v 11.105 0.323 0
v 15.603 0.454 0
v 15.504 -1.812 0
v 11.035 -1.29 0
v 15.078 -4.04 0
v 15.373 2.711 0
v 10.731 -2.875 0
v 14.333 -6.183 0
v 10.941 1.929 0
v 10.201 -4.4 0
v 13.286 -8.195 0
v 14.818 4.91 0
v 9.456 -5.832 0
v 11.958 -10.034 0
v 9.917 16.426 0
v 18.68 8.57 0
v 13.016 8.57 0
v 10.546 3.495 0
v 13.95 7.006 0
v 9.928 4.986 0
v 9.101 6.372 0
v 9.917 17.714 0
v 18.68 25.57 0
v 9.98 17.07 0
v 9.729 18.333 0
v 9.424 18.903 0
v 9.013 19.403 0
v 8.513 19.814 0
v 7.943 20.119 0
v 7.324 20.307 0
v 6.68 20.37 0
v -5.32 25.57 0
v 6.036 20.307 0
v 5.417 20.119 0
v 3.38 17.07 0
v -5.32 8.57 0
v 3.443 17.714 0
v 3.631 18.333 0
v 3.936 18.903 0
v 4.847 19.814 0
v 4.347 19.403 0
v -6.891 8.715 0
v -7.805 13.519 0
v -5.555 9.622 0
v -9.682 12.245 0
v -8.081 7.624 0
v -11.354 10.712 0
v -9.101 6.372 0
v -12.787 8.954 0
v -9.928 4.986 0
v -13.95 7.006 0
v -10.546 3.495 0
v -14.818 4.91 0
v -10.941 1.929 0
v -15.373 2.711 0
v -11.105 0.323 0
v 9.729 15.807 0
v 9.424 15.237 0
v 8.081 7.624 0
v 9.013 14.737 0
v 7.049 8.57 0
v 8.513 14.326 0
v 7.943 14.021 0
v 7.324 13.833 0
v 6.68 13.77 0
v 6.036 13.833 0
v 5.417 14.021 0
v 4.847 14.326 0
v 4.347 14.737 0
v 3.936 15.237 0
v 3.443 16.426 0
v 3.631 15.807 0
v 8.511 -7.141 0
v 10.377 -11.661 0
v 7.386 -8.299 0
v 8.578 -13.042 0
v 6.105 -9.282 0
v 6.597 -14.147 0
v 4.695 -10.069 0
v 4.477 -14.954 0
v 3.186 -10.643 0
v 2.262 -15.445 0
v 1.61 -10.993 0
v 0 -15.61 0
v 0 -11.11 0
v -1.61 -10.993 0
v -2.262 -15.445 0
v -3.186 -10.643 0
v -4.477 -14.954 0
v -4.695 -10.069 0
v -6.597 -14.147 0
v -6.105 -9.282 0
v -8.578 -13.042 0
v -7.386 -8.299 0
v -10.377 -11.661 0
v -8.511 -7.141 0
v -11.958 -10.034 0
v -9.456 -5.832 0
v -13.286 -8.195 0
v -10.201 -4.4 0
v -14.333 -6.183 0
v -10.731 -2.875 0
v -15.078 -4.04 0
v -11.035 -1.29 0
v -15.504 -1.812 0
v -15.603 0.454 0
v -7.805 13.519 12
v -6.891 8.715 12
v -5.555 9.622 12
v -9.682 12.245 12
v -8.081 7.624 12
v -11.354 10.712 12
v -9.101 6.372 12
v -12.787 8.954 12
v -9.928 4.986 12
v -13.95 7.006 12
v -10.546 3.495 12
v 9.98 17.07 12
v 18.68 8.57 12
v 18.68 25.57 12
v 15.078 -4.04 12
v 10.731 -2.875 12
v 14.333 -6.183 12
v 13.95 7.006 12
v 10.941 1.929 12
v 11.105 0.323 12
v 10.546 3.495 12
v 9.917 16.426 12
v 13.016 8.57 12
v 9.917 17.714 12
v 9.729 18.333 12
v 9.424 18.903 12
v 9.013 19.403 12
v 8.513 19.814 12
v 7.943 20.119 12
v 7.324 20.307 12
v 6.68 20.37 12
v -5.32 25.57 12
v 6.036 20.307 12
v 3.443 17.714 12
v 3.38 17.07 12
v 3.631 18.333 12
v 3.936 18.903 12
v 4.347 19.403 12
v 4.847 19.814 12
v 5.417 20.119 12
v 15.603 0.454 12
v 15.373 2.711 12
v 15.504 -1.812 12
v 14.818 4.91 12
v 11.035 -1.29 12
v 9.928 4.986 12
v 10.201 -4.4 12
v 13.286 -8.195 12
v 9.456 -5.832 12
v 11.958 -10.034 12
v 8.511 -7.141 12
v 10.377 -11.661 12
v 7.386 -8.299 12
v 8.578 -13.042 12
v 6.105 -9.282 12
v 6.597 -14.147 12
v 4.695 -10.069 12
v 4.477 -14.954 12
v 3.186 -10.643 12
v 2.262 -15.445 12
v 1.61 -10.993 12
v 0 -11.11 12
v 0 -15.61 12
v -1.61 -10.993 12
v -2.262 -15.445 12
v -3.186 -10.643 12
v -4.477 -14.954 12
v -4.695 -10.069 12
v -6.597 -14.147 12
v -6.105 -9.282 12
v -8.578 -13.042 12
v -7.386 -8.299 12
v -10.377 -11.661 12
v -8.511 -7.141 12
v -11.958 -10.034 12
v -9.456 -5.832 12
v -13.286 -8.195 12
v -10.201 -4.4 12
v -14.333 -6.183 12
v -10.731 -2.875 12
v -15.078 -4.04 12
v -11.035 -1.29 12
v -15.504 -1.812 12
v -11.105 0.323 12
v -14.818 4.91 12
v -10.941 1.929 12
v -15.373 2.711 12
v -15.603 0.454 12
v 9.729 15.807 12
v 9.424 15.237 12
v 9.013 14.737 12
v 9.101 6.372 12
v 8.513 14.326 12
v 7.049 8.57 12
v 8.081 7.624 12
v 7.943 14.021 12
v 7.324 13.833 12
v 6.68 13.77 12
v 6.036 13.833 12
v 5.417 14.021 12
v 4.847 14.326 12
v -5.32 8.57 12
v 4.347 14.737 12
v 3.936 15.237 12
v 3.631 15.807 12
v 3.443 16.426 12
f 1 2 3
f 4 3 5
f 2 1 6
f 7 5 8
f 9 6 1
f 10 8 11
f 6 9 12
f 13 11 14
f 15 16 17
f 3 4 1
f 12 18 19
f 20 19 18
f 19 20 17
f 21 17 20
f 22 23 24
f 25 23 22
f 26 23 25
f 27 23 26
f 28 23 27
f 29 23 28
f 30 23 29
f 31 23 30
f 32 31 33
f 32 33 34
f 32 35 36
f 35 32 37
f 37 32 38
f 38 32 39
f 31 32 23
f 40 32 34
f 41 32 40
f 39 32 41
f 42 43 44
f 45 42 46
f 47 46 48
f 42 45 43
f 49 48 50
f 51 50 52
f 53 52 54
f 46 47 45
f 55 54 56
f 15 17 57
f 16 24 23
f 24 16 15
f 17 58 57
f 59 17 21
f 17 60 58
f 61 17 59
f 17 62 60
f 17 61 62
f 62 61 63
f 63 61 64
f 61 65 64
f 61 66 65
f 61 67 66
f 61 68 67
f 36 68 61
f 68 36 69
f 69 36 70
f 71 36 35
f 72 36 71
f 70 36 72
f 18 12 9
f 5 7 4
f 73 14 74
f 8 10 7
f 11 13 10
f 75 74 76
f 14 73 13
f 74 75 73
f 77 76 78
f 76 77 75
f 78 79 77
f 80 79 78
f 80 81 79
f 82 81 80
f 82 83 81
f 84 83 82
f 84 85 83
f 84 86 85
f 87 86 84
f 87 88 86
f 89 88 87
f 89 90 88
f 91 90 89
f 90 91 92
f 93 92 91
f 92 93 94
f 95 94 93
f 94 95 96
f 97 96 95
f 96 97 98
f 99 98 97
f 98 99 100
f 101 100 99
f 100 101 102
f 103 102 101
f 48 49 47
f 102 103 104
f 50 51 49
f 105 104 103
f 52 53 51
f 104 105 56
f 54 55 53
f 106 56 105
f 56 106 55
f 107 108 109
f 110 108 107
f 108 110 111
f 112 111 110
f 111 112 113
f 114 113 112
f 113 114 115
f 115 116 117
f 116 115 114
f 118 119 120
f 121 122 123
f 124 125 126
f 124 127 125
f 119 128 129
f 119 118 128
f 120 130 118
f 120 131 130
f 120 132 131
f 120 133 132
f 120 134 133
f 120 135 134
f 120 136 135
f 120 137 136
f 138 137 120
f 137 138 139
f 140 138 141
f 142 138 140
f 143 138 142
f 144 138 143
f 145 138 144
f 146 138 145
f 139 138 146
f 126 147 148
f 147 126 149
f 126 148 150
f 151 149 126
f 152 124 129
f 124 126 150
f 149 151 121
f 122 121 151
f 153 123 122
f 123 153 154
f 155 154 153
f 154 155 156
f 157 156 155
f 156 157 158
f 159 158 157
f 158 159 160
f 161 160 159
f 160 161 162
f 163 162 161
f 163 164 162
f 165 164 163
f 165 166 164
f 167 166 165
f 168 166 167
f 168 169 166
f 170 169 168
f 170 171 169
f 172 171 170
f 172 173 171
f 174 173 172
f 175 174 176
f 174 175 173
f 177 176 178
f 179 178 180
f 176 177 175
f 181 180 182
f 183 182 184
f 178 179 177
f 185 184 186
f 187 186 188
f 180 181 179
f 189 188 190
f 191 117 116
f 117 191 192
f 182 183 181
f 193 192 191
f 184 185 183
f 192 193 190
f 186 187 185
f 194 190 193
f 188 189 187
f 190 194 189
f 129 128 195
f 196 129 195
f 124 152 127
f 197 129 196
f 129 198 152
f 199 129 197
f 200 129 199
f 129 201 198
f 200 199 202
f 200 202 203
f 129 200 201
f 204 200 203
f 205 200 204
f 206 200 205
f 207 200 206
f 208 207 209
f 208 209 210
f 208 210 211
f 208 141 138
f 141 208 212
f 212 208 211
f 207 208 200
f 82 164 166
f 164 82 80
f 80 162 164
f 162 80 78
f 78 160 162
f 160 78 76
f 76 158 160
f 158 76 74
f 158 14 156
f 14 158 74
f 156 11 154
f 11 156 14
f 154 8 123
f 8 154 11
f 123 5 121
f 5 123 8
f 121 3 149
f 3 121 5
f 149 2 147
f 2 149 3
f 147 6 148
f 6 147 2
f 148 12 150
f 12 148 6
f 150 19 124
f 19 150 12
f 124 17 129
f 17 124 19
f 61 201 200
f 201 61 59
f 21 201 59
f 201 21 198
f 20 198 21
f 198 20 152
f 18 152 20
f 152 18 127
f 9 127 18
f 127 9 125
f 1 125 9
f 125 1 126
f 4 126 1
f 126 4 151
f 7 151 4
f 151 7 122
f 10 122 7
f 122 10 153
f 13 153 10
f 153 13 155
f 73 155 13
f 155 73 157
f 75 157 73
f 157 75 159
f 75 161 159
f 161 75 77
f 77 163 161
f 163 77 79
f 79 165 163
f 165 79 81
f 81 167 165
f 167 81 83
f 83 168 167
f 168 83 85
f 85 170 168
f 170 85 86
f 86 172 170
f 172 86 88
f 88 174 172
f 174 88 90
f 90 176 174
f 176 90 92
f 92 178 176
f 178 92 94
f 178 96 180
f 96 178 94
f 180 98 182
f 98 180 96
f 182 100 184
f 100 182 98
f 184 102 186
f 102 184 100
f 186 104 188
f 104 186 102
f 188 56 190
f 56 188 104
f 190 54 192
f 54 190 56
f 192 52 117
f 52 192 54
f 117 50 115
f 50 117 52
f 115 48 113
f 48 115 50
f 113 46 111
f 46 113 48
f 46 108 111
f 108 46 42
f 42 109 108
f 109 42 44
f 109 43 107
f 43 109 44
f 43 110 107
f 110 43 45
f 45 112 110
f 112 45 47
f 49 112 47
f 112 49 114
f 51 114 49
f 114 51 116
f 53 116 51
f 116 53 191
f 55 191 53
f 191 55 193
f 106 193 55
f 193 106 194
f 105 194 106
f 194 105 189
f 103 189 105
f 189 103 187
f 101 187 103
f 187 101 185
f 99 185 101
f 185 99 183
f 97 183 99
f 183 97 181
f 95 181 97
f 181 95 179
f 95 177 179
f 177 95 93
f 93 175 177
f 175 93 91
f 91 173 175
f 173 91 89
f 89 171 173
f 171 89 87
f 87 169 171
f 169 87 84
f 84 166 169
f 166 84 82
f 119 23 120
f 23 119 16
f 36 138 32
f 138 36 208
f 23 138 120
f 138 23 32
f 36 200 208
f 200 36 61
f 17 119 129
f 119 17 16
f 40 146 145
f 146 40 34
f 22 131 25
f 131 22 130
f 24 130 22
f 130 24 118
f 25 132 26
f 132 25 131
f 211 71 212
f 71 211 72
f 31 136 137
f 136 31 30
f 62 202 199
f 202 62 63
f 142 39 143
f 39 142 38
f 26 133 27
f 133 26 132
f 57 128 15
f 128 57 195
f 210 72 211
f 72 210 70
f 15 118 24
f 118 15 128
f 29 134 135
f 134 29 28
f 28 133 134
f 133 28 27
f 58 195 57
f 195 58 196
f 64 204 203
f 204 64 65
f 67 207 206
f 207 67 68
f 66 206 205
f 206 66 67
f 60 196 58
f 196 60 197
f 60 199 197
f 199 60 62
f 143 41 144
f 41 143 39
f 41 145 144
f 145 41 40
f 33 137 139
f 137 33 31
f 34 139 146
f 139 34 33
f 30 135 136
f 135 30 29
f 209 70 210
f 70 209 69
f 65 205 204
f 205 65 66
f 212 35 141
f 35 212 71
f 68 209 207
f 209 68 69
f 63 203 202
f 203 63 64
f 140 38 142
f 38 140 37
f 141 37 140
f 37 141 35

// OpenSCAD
$fn = 32;

// ----------------------------------------------------------------------
// Pipe clamp: 31.22 mm ring, 4.5 mm wall, 12 mm wide
// ----------------------------------------------------------------------

// --- parameters (mm) ---
outer_r = 15.61;          // clamp outside radius
inner_r = 11.11;          // pipe bore radius
band = 4.5;               // band thickness
clamp_w = 12;             // clamp width
opening = 60;             // opening angle between the ends
lug_w = 24;               // lug width
lug_len = 17;             // lug length
bolt_d = 6.6;             // bolt hole

clamp_profile = [[-7.805, 13.519], [-9.682, 12.245], [-11.354, 10.712], [-12.787, 8.954], [-13.95, 7.006], [-14.818, 4.91], [-15.373, 2.711], [-15.603, 0.454], [-15.504, -1.812], [-15.078, -4.04], [-14.333, -6.183], [-13.286, -8.195], [-11.958, -10.034], [-10.377, -11.661], [-8.578, -13.042], [-6.597, -14.147], [-4.477, -14.954], [-2.262, -15.445], [0, -15.61], [2.262, -15.445], [4.477, -14.954], [6.597, -14.147], [8.578, -13.042], [10.377, -11.661], [11.958, -10.034], [13.286, -8.195], [14.333, -6.183], [15.078, -4.04], [15.504, -1.812], [15.603, 0.454], [15.373, 2.711], [14.818, 4.91], [13.95, 7.006], [12.787, 8.954], [11.354, 10.712], [9.682, 12.245], [7.805, 13.519], [5.555, 9.622], [6.891, 8.715], [8.081, 7.624], [9.101, 6.372], [9.928, 4.986], [10.546, 3.495], [10.941, 1.929], [11.105, 0.323], [11.035, -1.29], [10.731, -2.875], [10.201, -4.4], [9.456, -5.832], [8.511, -7.141], [7.386, -8.299], [6.105, -9.282], [4.695, -10.069], [3.186, -10.643], [1.61, -10.993], [0, -11.11], [-1.61, -10.993], [-3.186, -10.643], [-4.695, -10.069], [-6.105, -9.282], [-7.386, -8.299], [-8.511, -7.141], [-9.456, -5.832], [-10.201, -4.4], [-10.731, -2.875], [-11.035, -1.29], [-11.105, 0.323], [-10.941, 1.929], [-10.546, 3.495], [-9.928, 4.986], [-9.101, 6.372], [-8.081, 7.624], [-6.891, 8.715], [-5.555, 9.622]];

difference() {
  union() {
    linear_extrude(height = clamp_w) polygon(clamp_profile);
    /* bolt lug on the other end */
    translate([-5.32, 8.57, 0]) cube([lug_w, 17, clamp_w]);
  }
  translate([6.68, 17.07, -2.5]) cylinder(h = clamp_w + 5, d = bolt_d);
}
